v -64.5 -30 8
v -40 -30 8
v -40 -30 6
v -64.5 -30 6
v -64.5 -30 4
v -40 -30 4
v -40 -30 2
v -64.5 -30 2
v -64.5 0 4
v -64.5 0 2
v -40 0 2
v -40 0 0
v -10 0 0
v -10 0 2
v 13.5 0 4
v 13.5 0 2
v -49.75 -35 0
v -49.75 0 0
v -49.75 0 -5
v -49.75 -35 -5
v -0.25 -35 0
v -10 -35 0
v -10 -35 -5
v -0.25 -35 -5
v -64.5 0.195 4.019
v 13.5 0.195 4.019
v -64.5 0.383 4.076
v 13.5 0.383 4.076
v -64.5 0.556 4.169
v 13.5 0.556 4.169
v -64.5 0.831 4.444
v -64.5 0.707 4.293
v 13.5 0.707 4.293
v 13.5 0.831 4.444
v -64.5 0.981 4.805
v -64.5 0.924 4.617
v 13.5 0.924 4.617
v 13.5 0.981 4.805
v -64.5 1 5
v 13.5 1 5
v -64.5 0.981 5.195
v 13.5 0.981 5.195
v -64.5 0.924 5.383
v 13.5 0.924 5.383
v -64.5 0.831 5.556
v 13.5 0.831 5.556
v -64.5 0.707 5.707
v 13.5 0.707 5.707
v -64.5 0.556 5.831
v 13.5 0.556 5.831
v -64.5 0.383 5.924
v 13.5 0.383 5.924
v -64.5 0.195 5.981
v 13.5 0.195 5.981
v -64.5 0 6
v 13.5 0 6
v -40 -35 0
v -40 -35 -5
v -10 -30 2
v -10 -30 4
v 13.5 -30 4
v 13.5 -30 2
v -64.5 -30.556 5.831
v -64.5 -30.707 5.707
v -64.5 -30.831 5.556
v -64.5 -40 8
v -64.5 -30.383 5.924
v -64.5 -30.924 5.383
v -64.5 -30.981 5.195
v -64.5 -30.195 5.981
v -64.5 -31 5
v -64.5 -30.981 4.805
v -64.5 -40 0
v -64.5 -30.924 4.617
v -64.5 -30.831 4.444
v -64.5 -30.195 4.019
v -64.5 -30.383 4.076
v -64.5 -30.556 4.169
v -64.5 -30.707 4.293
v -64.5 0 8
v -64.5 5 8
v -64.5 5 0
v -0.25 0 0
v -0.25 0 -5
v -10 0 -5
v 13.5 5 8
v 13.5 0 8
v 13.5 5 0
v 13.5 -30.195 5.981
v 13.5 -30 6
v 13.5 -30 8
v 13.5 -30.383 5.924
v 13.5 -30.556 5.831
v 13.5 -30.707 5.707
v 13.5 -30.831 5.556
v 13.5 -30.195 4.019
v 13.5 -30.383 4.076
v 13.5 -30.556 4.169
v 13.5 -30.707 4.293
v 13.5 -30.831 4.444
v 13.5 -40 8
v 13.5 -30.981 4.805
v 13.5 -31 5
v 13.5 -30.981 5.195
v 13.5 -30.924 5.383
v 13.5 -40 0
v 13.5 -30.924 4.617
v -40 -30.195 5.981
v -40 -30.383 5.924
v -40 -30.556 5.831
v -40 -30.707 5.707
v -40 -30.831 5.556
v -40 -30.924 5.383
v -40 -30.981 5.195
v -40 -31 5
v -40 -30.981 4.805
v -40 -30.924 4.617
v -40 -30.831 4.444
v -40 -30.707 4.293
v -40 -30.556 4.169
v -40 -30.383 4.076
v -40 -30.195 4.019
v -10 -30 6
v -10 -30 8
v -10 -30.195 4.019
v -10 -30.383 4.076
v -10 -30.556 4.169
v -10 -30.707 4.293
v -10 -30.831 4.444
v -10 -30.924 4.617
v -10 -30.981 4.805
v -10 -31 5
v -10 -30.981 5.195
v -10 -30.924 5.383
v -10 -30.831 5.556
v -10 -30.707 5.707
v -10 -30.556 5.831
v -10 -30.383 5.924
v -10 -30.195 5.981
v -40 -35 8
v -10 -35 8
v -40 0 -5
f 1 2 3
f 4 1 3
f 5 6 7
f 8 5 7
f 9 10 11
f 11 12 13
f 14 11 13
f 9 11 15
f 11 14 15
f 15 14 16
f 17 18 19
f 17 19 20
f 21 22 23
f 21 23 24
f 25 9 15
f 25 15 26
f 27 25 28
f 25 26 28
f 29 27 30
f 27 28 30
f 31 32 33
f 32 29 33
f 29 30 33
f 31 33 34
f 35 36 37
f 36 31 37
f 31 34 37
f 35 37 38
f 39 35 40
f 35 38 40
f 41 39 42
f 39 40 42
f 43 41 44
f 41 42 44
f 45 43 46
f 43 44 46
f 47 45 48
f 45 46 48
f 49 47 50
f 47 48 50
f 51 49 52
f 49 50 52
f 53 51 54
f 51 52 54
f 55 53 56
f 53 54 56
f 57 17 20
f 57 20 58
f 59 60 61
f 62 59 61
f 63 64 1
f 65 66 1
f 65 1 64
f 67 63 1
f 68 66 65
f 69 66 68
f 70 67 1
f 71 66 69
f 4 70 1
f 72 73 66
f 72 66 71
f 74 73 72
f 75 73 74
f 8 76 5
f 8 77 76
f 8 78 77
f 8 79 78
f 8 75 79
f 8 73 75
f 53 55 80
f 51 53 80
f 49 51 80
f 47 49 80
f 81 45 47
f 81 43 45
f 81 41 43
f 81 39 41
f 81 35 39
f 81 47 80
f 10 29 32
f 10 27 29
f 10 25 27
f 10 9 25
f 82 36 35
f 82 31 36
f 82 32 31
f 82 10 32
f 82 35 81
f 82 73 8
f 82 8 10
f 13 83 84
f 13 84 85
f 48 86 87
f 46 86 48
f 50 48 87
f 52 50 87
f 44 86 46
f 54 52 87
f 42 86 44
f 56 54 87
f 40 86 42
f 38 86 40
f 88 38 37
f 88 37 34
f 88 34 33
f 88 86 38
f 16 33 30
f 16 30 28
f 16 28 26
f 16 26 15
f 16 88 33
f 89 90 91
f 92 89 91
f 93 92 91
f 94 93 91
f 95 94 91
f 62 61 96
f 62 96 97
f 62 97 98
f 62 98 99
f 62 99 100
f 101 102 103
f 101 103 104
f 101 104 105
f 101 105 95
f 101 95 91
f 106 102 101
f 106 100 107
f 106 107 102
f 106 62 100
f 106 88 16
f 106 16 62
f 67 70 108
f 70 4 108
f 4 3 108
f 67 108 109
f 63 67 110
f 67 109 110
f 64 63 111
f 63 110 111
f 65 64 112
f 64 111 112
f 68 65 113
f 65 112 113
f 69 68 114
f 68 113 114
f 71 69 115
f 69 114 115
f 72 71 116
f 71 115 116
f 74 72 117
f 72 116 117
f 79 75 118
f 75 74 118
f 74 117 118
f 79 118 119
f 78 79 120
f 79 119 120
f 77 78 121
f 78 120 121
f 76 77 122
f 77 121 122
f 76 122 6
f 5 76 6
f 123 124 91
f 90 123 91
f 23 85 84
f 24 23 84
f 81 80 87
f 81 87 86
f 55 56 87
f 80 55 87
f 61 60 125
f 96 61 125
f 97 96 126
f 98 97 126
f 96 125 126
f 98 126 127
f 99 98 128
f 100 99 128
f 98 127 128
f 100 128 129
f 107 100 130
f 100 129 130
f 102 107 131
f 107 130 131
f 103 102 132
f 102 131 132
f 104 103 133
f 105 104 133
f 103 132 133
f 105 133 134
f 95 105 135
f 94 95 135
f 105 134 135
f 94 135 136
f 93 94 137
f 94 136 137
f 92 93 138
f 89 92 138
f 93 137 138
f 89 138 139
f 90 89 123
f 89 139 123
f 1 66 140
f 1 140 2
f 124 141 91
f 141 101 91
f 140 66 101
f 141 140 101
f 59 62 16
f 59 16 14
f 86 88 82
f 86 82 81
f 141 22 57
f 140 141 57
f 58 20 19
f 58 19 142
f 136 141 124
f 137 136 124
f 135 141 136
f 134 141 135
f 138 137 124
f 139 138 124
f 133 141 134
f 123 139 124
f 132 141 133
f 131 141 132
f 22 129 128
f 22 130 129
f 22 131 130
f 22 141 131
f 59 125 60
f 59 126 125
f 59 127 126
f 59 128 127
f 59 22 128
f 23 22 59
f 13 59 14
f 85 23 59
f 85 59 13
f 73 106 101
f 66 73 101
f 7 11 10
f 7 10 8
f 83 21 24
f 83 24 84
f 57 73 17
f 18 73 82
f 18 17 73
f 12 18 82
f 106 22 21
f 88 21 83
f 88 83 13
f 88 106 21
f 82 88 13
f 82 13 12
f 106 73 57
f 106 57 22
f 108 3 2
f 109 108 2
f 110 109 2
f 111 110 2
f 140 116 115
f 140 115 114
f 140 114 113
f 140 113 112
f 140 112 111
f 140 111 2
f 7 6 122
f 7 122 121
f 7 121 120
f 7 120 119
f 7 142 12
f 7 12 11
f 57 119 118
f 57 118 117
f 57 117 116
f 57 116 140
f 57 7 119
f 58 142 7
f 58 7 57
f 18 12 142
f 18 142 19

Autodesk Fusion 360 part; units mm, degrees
sketch "スケッチ1" plane through (0, 0, 0) normal (0, 0, 1) x (1, 0, 0)
  line L0 (0, 0) -> (-50, 0)
  line L1 (-50, 0) -> (-50, -35)
  line L2 (-50, -35) -> (0, -35)
  line L3 (0, -35) -> (0, 0)
  line L4 (-65, 5) -> (15, 5)
  line L5 (15, 5) -> (15, -40)
  line L6 (15, -40) -> (-65, -40)
  line L7 (-65, -40) -> (-65, 5)
extrude "押し出し1" add sketch "スケッチ1" against normal blind 5 contours L0 L1 L2 L3
extrude "押し出し2" add sketch "スケッチ1" along normal blind 5 contours L0 L1 L2 L3 | L4 L5 L6 L7
sketch "スケッチ2" plane through (0, 0, 5) normal (0, 0, 1) x (-1, 0, 0)
  line L0 (65, 40) -> (-15, 40)
  line L1 (-15, 40) -> (-15, -5)
  line L2 (-15, -5) -> (65, -5)
  line L3 (65, -5) -> (65, 40)
  line L4 (-15, 0) -> (65, 0)
  line L5 (65, 0) -> (65, 30)
  line L6 (65, 30) -> (-15, 30)
  line L7 (-15, 30) -> (-15, 0)
extrude "押し出し3" cut sketch "スケッチ2" against normal blind 3 contours L1 L3 L4 L5 L6 L7
sketch "スケッチ3" plane through (0, 0, -5) normal (0, 0, -1) x (1, 0, 0)
  line L0 (0, 0) -> (0, 35)
  line L1 (0, 35) -> (-50, 35)
  line L2 (-50, 35) -> (-50, 0)
  line L3 (-50, 0) -> (0, 0)
  line L4 (-10, 0) -> (-40, 0)
  line L5 (-40, 0) -> (-40, 35)
  line L6 (-40, 35) -> (-10, 35)
  line L7 (-10, 35) -> (-10, 0)
extrude "押し出し4" cut sketch "スケッチ3" against normal blind 10 contours L1 L3 L4 L5 L6 L7
extrude "押し出し5" add 2 faces at (-38.3333, 3.3333, 5) (-56.6667, -35, 5) along direction (0, 0, 1) blind 3
sketch "スケッチ4" plane through (-65, 0, 0) normal (-1, 0, 0) x (0, -1, 0)
  line L0 (0, 2) -> (0, 8)
  line L1 (0, 8) -> (-5, 8)
  line L2 (-5, 8) -> (-5, 0)
  line L3 (-5, 0) -> (40, 0)
  line L4 (40, 0) -> (40, 8)
  line L5 (40, 8) -> (30, 8)
  line L6 (30, 8) -> (30, 2)
  line L7 (30, 2) -> (0, 2)
  line L8 (0, 5) -> (30, 5)
  line L9 (0, 4) -> (30, 4)
  arc A0 (30, 4) -> (30, 6) centre (30, 5) ccw
  line L10 (30, 6) -> (0, 6)
  arc A1 (0, 6) -> (0, 4) centre (0, 5) ccw
  line L11 (0, 5) -> (30, 5) construction
extrude "押し出し6" cut sketch "スケッチ4" against normal blind 80 contours L0 A1 | L6 A0
sketch "スケッチ5" plane through (0, 0, -5) normal (0, 0, -1) x (1, 0, 0)
  line L0 (-40, 0) -> (-40, 35)
  line L1 (-40, 35) -> (-50, 35)
  line L2 (-50, 35) -> (-50, 0)
  line L3 (-50, 0) -> (-40, 0)
extrude "押し出し7" cut 1 faces at (-65, -36.9916, 4.2592) along direction (1, 0, 0) blind 1
extrude "押し出し8" cut 1 faces at (-64, -36.9916, 4.2592) along direction (1, 0, 0) blind 1
extrude "押し出し9" cut 1 faces at (15, -36.9916, 4.2592) along direction (-1, 0, 0) blind 1
extrude "押し出し10" add 1 faces at (-63, -36.9916, 4.2592) along direction (-1, 0, 0) blind 0.5
extrude "押し出し11" cut 1 faces at (14, -36.9916, 4.2592) along direction (-1, 0, 0) blind 0.5
extrude "押し出し12" cut 1 faces at (0, -23.3333, -3.3333) along direction (-1, 0, 0) blind 0.25
extrude "押し出し13" cut 1 faces at (-50, -11.6667, -3.3333) along direction (1, 0, 0) blind 0.25
extrude "押し出し14" add 1 faces at (-63.5, -36.9916, 4.2592) along direction (-1, 0, 0) blind 1
